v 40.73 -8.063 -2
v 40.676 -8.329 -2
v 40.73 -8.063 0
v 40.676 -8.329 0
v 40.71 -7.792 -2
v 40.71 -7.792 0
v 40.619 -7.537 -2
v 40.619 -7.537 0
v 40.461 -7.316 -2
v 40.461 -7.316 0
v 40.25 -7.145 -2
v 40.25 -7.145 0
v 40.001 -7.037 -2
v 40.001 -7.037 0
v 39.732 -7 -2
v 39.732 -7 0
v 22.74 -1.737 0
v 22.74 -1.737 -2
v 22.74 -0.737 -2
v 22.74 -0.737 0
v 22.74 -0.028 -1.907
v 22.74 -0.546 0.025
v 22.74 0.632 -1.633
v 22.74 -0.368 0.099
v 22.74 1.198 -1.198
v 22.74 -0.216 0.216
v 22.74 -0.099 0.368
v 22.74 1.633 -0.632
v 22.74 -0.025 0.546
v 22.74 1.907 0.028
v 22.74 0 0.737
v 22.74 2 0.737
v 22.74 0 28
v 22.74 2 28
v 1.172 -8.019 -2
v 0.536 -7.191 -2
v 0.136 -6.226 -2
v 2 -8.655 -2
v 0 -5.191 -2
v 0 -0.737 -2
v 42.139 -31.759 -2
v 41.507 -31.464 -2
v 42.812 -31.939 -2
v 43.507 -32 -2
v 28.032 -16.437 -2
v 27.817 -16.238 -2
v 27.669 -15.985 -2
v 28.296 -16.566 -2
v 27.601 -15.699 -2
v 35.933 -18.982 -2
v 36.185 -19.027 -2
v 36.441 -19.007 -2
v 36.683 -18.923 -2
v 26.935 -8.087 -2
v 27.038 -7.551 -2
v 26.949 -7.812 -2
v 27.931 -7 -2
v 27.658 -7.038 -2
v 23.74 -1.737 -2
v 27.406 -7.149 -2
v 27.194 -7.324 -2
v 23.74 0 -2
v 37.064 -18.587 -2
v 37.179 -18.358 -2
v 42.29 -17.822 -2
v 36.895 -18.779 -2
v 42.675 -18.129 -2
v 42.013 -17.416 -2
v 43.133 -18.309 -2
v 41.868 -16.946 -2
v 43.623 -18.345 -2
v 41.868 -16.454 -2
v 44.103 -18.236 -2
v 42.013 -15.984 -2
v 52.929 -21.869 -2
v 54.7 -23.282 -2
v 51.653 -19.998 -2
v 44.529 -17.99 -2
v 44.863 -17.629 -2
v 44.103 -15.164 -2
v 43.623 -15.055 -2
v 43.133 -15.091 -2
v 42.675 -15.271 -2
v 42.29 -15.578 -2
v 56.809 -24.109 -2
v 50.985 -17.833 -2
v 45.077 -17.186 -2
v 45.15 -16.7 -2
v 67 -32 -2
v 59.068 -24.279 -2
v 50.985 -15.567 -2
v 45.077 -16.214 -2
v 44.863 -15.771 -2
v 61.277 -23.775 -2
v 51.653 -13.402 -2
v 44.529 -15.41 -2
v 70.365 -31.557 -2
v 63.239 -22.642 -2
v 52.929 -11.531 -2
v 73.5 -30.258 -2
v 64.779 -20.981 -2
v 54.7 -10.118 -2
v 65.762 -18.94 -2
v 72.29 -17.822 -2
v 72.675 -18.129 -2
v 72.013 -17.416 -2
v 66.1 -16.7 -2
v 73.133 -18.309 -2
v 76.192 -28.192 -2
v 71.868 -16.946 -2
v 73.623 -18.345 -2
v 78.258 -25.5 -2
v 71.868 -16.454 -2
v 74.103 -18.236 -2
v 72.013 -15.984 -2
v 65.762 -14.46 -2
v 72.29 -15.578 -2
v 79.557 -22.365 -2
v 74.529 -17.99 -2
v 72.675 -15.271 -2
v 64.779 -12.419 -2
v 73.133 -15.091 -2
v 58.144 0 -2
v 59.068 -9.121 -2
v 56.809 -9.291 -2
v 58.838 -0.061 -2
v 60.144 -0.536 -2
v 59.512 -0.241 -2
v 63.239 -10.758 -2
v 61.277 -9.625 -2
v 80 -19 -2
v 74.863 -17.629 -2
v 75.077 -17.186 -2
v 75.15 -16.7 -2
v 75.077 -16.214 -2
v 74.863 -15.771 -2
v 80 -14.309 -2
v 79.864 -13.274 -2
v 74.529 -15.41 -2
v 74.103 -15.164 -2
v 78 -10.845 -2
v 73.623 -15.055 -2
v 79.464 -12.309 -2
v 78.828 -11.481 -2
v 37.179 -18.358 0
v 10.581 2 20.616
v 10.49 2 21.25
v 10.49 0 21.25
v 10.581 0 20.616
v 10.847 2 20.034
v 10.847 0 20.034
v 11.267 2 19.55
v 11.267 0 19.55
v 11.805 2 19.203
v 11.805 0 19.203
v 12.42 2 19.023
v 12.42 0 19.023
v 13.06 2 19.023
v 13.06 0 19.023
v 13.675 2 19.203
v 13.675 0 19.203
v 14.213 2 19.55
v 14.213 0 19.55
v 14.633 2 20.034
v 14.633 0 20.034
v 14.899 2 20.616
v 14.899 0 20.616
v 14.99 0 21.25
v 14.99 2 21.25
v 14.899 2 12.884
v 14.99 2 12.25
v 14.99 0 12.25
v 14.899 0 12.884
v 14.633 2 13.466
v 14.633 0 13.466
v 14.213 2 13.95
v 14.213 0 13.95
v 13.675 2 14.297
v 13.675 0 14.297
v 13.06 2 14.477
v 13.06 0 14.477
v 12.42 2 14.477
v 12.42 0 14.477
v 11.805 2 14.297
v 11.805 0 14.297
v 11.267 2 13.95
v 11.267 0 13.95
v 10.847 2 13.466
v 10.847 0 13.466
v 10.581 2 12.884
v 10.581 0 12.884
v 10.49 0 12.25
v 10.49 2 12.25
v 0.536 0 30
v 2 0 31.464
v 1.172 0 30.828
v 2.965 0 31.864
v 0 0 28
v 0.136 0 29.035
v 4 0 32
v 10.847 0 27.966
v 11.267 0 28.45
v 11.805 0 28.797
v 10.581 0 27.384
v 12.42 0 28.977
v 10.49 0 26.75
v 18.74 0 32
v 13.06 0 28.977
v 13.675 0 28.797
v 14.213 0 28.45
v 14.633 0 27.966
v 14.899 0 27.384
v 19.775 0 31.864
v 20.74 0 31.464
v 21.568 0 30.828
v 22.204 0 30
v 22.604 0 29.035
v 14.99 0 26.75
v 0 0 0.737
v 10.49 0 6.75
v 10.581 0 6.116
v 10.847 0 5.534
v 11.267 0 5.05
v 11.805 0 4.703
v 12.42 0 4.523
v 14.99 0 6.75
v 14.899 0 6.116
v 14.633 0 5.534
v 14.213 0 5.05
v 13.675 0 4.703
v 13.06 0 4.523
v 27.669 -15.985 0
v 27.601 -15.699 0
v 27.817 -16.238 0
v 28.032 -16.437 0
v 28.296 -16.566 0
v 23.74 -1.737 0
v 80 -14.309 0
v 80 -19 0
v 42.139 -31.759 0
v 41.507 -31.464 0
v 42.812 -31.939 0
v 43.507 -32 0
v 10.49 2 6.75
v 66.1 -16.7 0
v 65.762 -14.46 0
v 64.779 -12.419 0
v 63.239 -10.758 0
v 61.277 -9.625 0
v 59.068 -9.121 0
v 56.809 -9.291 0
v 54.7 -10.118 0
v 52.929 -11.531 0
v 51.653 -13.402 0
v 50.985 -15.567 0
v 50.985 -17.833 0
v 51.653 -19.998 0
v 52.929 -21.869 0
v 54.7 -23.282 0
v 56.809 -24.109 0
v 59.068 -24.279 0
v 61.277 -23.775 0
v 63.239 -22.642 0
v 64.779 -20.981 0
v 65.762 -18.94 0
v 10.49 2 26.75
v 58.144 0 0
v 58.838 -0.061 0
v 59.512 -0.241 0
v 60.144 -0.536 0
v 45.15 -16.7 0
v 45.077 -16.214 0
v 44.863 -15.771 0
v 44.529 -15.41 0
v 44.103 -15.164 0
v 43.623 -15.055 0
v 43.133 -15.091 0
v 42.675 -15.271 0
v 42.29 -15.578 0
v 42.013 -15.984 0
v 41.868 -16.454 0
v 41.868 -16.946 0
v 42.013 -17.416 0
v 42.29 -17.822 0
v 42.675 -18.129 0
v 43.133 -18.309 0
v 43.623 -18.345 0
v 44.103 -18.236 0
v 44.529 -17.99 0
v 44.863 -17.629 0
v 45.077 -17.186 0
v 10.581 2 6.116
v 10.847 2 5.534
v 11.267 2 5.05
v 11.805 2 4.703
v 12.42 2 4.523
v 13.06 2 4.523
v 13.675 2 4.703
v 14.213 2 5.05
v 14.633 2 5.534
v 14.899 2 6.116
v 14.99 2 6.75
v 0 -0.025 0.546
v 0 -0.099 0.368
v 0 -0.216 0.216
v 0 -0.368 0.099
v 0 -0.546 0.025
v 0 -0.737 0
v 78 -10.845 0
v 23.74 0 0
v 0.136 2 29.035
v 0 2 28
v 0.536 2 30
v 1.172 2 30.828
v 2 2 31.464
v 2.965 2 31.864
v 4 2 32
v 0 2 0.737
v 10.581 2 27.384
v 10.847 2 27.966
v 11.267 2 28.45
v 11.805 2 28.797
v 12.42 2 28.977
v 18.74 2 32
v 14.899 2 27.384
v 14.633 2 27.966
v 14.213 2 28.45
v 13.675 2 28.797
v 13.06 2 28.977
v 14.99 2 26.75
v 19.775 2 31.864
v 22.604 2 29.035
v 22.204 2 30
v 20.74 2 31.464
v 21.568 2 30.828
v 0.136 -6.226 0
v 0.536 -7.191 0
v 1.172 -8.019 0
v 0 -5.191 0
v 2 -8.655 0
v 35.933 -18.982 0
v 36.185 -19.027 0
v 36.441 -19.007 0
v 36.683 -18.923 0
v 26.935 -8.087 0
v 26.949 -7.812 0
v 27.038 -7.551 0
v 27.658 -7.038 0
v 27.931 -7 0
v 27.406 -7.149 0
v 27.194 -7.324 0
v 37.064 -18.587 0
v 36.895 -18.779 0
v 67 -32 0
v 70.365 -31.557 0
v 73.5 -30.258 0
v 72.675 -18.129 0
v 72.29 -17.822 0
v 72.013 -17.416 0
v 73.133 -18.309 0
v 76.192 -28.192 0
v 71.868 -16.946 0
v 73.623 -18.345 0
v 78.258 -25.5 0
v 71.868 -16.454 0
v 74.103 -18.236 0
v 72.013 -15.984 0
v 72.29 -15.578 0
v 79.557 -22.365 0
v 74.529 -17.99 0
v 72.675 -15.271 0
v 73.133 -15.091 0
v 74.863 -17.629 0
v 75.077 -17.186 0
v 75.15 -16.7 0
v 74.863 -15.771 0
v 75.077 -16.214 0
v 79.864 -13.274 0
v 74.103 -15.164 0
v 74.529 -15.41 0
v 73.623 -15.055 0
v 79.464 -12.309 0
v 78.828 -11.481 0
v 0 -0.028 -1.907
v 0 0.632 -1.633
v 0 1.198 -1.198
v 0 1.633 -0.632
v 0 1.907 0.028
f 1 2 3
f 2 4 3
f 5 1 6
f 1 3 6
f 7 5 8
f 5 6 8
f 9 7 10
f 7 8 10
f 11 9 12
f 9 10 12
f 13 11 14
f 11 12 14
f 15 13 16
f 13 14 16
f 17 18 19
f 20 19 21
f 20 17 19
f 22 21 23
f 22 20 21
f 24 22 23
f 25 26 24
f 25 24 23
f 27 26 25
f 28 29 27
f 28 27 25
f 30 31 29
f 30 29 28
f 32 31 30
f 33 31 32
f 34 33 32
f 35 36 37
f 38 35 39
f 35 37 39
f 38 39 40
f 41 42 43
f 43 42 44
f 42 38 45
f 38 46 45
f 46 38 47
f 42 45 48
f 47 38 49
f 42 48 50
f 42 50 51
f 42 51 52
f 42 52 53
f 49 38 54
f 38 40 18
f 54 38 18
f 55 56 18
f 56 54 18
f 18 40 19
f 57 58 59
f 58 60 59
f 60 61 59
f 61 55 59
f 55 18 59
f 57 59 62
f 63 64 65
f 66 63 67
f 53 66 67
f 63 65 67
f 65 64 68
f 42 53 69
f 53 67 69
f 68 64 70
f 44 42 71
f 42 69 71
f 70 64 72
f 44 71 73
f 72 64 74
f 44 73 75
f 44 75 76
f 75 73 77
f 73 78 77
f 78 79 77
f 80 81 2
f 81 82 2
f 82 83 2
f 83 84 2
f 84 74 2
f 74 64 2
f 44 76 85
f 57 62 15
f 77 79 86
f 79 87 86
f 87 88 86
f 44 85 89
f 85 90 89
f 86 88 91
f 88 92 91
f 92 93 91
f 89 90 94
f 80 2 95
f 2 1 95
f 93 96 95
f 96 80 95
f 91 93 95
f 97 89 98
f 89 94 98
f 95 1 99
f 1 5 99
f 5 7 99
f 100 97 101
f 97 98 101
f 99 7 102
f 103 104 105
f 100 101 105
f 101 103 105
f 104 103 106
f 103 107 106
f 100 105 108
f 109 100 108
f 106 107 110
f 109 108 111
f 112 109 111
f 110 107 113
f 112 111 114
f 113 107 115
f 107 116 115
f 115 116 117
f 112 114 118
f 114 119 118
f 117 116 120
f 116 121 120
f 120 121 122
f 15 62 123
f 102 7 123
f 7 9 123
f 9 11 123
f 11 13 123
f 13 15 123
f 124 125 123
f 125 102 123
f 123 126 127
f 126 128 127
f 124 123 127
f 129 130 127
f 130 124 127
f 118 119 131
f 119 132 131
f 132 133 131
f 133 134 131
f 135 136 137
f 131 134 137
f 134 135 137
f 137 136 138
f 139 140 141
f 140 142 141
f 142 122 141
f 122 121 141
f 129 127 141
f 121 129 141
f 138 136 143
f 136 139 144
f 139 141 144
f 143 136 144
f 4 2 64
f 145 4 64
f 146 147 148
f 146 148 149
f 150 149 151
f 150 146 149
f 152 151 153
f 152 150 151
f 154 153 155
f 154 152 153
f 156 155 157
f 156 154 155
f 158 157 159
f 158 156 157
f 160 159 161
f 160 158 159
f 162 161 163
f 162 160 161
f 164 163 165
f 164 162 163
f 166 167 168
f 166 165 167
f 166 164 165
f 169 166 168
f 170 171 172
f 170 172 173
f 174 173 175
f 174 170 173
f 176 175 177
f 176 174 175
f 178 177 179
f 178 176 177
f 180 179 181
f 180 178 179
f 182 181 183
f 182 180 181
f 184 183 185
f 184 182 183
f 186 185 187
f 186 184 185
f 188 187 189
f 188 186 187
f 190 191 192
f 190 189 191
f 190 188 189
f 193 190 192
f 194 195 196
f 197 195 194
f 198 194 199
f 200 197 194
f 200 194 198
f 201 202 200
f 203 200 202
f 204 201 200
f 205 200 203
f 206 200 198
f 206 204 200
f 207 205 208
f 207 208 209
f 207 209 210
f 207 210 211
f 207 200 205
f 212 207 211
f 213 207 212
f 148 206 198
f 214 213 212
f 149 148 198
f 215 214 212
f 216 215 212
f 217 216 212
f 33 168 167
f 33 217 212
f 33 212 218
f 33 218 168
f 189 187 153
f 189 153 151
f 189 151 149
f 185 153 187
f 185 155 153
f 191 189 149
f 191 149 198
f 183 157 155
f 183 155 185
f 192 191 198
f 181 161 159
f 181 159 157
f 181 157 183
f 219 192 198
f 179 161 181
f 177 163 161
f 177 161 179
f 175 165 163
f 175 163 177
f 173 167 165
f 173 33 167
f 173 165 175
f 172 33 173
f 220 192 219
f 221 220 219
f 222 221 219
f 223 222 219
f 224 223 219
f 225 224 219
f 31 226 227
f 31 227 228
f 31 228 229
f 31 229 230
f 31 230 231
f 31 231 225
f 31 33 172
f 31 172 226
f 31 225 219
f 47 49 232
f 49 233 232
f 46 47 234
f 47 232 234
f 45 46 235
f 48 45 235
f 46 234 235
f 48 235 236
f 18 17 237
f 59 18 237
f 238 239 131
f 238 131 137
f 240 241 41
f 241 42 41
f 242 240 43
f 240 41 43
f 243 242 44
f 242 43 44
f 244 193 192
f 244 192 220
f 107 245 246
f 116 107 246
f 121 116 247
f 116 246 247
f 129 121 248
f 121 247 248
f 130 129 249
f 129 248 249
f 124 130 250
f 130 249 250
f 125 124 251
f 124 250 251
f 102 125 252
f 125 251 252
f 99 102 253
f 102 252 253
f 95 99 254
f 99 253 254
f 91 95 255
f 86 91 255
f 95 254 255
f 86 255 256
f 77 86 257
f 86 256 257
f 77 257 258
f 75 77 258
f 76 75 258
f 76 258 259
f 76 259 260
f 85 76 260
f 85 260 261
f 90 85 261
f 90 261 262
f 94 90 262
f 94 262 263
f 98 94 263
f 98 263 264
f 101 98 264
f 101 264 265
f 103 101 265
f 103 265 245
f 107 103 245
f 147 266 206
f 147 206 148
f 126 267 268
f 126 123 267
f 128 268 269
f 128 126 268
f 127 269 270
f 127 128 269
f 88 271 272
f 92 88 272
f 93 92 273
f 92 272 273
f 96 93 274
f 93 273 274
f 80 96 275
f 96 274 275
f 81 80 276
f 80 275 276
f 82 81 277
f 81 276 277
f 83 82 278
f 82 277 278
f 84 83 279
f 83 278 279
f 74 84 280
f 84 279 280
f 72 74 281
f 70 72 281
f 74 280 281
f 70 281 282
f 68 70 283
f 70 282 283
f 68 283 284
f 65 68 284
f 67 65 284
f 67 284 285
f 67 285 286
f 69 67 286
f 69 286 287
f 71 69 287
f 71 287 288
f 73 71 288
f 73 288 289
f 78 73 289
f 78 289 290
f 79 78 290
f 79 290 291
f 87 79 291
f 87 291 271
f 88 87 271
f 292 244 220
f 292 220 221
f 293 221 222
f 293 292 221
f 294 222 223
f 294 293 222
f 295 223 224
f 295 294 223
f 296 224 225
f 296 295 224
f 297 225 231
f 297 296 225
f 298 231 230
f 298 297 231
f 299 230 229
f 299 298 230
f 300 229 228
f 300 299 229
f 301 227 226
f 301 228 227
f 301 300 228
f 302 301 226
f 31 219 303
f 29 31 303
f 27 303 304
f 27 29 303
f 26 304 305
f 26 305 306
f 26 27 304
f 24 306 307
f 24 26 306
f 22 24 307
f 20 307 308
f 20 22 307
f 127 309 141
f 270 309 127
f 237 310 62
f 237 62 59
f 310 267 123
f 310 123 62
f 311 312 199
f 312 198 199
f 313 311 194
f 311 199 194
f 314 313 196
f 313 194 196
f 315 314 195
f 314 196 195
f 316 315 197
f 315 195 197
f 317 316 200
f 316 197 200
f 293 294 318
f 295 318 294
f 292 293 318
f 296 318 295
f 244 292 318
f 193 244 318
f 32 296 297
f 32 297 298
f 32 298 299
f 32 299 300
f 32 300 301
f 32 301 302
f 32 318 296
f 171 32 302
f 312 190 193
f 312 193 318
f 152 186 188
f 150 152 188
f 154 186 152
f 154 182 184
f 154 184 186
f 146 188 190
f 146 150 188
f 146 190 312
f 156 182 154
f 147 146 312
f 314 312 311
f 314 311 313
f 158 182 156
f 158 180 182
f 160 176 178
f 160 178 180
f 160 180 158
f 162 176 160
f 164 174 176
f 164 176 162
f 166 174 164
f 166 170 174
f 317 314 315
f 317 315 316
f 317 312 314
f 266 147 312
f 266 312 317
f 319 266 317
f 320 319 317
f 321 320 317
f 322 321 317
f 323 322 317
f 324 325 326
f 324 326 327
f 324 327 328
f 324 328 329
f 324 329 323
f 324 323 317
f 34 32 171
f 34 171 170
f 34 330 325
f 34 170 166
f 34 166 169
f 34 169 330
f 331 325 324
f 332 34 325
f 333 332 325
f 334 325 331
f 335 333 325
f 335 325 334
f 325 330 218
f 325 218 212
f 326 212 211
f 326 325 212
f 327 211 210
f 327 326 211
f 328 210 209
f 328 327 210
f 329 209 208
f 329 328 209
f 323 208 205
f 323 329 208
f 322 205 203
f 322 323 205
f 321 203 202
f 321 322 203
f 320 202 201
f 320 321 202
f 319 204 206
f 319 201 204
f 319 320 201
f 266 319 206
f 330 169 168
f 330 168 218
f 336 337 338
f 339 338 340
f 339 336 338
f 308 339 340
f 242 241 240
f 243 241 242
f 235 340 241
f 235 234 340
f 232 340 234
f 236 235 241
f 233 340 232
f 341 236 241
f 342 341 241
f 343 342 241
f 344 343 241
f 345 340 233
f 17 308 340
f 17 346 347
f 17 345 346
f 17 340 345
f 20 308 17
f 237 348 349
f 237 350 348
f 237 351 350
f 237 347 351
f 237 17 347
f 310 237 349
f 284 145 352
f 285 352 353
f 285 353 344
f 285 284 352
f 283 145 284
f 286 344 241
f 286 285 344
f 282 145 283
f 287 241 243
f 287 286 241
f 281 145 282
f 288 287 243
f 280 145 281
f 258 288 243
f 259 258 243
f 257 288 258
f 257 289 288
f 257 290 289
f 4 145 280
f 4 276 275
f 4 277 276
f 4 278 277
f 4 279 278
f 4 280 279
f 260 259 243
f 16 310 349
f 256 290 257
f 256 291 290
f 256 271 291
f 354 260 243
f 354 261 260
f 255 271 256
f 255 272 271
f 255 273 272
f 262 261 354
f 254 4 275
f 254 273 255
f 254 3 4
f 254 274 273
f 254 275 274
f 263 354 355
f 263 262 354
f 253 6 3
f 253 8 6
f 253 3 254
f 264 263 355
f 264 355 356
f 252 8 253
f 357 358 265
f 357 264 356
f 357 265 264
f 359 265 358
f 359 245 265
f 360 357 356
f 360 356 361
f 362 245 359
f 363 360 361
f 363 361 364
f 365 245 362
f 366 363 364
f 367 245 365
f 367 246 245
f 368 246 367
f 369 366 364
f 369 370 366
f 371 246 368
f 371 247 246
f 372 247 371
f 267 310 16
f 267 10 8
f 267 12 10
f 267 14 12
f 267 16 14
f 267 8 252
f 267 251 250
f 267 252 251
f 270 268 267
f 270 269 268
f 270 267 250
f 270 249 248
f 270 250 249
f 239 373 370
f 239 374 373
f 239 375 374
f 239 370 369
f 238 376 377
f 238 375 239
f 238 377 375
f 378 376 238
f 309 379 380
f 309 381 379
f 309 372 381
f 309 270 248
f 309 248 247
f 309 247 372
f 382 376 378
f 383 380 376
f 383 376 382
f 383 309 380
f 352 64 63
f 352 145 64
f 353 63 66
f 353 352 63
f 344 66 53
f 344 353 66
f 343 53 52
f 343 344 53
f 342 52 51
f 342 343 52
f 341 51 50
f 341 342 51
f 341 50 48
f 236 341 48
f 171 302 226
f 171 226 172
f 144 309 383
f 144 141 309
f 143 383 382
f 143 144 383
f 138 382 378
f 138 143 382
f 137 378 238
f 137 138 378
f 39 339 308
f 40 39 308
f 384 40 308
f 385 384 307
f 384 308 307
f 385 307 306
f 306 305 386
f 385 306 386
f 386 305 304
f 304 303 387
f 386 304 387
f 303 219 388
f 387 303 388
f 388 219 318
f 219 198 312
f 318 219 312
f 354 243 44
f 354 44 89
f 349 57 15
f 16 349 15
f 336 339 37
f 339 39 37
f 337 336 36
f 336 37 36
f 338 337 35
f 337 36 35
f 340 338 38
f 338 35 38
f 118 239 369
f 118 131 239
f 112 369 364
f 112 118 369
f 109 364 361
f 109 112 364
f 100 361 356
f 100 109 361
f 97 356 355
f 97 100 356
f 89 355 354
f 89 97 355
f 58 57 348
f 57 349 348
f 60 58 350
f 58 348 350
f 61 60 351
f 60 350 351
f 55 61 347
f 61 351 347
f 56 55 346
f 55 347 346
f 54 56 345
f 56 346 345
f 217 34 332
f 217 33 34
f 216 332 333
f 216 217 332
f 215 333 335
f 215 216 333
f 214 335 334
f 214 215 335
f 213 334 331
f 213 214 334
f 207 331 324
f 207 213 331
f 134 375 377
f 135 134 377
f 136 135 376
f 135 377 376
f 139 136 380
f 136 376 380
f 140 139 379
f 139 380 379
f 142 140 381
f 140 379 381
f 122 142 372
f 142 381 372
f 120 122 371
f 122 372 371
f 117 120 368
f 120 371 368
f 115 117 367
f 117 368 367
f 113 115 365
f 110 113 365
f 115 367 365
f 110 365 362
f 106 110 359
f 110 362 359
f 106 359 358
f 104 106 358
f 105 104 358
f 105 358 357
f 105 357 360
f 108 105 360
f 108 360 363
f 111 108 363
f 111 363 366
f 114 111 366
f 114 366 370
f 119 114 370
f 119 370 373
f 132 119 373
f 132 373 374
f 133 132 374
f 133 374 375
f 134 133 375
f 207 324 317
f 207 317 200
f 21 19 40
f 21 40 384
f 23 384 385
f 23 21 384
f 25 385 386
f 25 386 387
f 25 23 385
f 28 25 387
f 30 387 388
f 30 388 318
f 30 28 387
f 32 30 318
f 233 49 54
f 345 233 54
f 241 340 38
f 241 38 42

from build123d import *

# Parameters (mm, degrees)
SM_BASE_FLANGE_1_DEPTH            = 2
SKETCH_6_R                        = 7.6
SKETCH_6_R_2                      = 1.65
CUT_EXTRUDE_1_DEPTH               = 10
SM_EDGE_FLANGE_1_STRIP_W          = 9.4732
SM_EDGE_FLANGE_1_STRIP_H          = 2
SM_EDGE_FLANGE_1_STRIP_CUT_DEPTH  = 22.74
SM_EDGE_FLANGE_1_RELIEF_W         = 10.4732
SM_EDGE_FLANGE_1_RELIEF_H         = 1
SM_EDGE_FLANGE_1_RELIEF_CUT_DEPTH = 2
SM_EDGE_FLANGE_1_DEPTH            = 22.74
CUT_EXTRUDE_2_DEPTH               = 10
FILLET_1_R                        = 4
CUT_EXTRUDE_3_DEPTH               = 10
FILLET_2_R                        = 1
FILLET_3_R                        = 13


# Sheet-metal steps are written as plain solids
with BuildPart() as part:
    # Sketch 1 → 基体-法兰1 (new body)
    with BuildSketch(Plane.XY):
        Polygon((0, 0), (0, -7.5), (42.435244785, -32), (80, -32), (80, -12), (59.215390309, 0), align=None)
    extrude(amount=-SM_BASE_FLANGE_1_DEPTH)

    # 草图6 → 切除-拉伸1 (cut)
    with BuildSketch(Plane.XY):
        with Locations((58.5, -16.7)):
            Circle(SKETCH_6_R)
        with Locations((73.5, -16.7)):
            Circle(SKETCH_6_R_2)
        with Locations((43.5, -16.7)):
            Circle(SKETCH_6_R_2)
    extrude(amount=-CUT_EXTRUDE_1_DEPTH, mode=Mode.SUBTRACT)

    # 边线-法兰1 strip (across the edge) → 边线-法兰1 strip cut (cut)
    with BuildSketch(Plane(origin=(22.74, 0, 0), x_dir=(0, -1, 0), z_dir=(-1, 0, 0))):
        with Locations((-4, -1)):
            Rectangle(SM_EDGE_FLANGE_1_STRIP_W, SM_EDGE_FLANGE_1_STRIP_H)
    extrude(amount=SM_EDGE_FLANGE_1_STRIP_CUT_DEPTH, mode=Mode.SUBTRACT)

    # 边线-法兰1 relief (on the sheet) → 边线-法兰1 relief cut (cut)
    with BuildSketch(Plane(origin=(22.74, -0.7366, 0), x_dir=(0, -1, 0), z_dir=(0, 0, 1))):
        with Locations((-4.2366, 0.5)):
            Rectangle(SM_EDGE_FLANGE_1_RELIEF_W, SM_EDGE_FLANGE_1_RELIEF_H)
    extrude(amount=-SM_EDGE_FLANGE_1_RELIEF_CUT_DEPTH, mode=Mode.SUBTRACT)

    # 边线-法兰1 section (across the edge) → 边线-法兰1 (add)
    with BuildSketch(Plane(origin=(22.74, 0, 0), x_dir=(0, -1, 0), z_dir=(-1, 0, 0))):
        with BuildLine():
            Line((-2, 0.7366), (-2, 32))
            Line((-2, 32), (0, 32))
            Line((0, 32), (0, 0.7366))
            ThreePointArc((0, 0.7366), (0.215745145, 0.215745145), (0.7366, 0))
            Line((0.7366, 0), (0.7366, -2))
            ThreePointArc((0.7366, -2), (-1.198468417, -1.198468417), (-2, 0.7366))
        make_face()
    extrude(amount=SM_EDGE_FLANGE_1_DEPTH)

    # 草图12 → 切除-拉伸2 (cut)
    with BuildSketch(Plane(origin=(0, 2, 0), x_dir=(1, 0, 0), z_dir=(0, 1, 0))):
        with BuildLine():
            Line((10.49, -26.75), (10.49, -21.25))
            ThreePointArc((10.49, -21.25), (12.74, -19), (14.99, -21.25))
            Line((14.99, -21.25), (14.99, -26.75))
            ThreePointArc((14.99, -26.75), (12.74, -29), (10.49, -26.75))
        make_face()
        with BuildLine():
            Line((10.49, -12.25), (10.49, -6.75))
            ThreePointArc((10.49, -6.75), (12.74, -4.5), (14.99, -6.75))
            Line((14.99, -6.75), (14.99, -12.25))
            ThreePointArc((14.99, -12.25), (12.74, -14.5), (10.49, -12.25))
        make_face()
    extrude(amount=-CUT_EXTRUDE_2_DEPTH, mode=Mode.SUBTRACT)

    # 圆角1
    fillet_1_edges = [part.edges().sort_by_distance(p)[0] for p in [
        (59.215390309, 0, -1),
        (80, -12, -1),
        (42.435244785, -32, -1),
        (0, -7.5, -1),
        (22.74, 1, 32),
        (0, 1, 32),
    ]]
    fillet(fillet_1_edges, radius=FILLET_1_R)

    # 草图14 → 切除-拉伸3 (cut)
    with BuildSketch(Plane(origin=(0, 0, -2), x_dir=(-1, 0, 0), z_dir=(0, 0, -1))):
        Polygon((-36.859263982, -19.274986727), (-27.659263982, -16.364230162), (-26.84, -7), (-41.14, -7), align=None)
    extrude(amount=-CUT_EXTRUDE_3_DEPTH, mode=Mode.SUBTRACT)

    # 圆角2
    fillet_2_edges = [part.edges().sort_by_distance(p)[0] for p in [
        (26.84, -7, -1),
        (27.659263982, -16.364230162, -1),
        (36.859263982, -19.274986727, -1),
        (41.14, -7, -1),
    ]]
    fillet(fillet_2_edges, radius=FILLET_2_R)

    # 圆角3
    fillet_3_edges = [part.edges().sort_by_distance(p)[0] for p in [
        (80, -32, -1),
    ]]
    fillet(fillet_3_edges, radius=FILLET_3_R)


solid = part.part
